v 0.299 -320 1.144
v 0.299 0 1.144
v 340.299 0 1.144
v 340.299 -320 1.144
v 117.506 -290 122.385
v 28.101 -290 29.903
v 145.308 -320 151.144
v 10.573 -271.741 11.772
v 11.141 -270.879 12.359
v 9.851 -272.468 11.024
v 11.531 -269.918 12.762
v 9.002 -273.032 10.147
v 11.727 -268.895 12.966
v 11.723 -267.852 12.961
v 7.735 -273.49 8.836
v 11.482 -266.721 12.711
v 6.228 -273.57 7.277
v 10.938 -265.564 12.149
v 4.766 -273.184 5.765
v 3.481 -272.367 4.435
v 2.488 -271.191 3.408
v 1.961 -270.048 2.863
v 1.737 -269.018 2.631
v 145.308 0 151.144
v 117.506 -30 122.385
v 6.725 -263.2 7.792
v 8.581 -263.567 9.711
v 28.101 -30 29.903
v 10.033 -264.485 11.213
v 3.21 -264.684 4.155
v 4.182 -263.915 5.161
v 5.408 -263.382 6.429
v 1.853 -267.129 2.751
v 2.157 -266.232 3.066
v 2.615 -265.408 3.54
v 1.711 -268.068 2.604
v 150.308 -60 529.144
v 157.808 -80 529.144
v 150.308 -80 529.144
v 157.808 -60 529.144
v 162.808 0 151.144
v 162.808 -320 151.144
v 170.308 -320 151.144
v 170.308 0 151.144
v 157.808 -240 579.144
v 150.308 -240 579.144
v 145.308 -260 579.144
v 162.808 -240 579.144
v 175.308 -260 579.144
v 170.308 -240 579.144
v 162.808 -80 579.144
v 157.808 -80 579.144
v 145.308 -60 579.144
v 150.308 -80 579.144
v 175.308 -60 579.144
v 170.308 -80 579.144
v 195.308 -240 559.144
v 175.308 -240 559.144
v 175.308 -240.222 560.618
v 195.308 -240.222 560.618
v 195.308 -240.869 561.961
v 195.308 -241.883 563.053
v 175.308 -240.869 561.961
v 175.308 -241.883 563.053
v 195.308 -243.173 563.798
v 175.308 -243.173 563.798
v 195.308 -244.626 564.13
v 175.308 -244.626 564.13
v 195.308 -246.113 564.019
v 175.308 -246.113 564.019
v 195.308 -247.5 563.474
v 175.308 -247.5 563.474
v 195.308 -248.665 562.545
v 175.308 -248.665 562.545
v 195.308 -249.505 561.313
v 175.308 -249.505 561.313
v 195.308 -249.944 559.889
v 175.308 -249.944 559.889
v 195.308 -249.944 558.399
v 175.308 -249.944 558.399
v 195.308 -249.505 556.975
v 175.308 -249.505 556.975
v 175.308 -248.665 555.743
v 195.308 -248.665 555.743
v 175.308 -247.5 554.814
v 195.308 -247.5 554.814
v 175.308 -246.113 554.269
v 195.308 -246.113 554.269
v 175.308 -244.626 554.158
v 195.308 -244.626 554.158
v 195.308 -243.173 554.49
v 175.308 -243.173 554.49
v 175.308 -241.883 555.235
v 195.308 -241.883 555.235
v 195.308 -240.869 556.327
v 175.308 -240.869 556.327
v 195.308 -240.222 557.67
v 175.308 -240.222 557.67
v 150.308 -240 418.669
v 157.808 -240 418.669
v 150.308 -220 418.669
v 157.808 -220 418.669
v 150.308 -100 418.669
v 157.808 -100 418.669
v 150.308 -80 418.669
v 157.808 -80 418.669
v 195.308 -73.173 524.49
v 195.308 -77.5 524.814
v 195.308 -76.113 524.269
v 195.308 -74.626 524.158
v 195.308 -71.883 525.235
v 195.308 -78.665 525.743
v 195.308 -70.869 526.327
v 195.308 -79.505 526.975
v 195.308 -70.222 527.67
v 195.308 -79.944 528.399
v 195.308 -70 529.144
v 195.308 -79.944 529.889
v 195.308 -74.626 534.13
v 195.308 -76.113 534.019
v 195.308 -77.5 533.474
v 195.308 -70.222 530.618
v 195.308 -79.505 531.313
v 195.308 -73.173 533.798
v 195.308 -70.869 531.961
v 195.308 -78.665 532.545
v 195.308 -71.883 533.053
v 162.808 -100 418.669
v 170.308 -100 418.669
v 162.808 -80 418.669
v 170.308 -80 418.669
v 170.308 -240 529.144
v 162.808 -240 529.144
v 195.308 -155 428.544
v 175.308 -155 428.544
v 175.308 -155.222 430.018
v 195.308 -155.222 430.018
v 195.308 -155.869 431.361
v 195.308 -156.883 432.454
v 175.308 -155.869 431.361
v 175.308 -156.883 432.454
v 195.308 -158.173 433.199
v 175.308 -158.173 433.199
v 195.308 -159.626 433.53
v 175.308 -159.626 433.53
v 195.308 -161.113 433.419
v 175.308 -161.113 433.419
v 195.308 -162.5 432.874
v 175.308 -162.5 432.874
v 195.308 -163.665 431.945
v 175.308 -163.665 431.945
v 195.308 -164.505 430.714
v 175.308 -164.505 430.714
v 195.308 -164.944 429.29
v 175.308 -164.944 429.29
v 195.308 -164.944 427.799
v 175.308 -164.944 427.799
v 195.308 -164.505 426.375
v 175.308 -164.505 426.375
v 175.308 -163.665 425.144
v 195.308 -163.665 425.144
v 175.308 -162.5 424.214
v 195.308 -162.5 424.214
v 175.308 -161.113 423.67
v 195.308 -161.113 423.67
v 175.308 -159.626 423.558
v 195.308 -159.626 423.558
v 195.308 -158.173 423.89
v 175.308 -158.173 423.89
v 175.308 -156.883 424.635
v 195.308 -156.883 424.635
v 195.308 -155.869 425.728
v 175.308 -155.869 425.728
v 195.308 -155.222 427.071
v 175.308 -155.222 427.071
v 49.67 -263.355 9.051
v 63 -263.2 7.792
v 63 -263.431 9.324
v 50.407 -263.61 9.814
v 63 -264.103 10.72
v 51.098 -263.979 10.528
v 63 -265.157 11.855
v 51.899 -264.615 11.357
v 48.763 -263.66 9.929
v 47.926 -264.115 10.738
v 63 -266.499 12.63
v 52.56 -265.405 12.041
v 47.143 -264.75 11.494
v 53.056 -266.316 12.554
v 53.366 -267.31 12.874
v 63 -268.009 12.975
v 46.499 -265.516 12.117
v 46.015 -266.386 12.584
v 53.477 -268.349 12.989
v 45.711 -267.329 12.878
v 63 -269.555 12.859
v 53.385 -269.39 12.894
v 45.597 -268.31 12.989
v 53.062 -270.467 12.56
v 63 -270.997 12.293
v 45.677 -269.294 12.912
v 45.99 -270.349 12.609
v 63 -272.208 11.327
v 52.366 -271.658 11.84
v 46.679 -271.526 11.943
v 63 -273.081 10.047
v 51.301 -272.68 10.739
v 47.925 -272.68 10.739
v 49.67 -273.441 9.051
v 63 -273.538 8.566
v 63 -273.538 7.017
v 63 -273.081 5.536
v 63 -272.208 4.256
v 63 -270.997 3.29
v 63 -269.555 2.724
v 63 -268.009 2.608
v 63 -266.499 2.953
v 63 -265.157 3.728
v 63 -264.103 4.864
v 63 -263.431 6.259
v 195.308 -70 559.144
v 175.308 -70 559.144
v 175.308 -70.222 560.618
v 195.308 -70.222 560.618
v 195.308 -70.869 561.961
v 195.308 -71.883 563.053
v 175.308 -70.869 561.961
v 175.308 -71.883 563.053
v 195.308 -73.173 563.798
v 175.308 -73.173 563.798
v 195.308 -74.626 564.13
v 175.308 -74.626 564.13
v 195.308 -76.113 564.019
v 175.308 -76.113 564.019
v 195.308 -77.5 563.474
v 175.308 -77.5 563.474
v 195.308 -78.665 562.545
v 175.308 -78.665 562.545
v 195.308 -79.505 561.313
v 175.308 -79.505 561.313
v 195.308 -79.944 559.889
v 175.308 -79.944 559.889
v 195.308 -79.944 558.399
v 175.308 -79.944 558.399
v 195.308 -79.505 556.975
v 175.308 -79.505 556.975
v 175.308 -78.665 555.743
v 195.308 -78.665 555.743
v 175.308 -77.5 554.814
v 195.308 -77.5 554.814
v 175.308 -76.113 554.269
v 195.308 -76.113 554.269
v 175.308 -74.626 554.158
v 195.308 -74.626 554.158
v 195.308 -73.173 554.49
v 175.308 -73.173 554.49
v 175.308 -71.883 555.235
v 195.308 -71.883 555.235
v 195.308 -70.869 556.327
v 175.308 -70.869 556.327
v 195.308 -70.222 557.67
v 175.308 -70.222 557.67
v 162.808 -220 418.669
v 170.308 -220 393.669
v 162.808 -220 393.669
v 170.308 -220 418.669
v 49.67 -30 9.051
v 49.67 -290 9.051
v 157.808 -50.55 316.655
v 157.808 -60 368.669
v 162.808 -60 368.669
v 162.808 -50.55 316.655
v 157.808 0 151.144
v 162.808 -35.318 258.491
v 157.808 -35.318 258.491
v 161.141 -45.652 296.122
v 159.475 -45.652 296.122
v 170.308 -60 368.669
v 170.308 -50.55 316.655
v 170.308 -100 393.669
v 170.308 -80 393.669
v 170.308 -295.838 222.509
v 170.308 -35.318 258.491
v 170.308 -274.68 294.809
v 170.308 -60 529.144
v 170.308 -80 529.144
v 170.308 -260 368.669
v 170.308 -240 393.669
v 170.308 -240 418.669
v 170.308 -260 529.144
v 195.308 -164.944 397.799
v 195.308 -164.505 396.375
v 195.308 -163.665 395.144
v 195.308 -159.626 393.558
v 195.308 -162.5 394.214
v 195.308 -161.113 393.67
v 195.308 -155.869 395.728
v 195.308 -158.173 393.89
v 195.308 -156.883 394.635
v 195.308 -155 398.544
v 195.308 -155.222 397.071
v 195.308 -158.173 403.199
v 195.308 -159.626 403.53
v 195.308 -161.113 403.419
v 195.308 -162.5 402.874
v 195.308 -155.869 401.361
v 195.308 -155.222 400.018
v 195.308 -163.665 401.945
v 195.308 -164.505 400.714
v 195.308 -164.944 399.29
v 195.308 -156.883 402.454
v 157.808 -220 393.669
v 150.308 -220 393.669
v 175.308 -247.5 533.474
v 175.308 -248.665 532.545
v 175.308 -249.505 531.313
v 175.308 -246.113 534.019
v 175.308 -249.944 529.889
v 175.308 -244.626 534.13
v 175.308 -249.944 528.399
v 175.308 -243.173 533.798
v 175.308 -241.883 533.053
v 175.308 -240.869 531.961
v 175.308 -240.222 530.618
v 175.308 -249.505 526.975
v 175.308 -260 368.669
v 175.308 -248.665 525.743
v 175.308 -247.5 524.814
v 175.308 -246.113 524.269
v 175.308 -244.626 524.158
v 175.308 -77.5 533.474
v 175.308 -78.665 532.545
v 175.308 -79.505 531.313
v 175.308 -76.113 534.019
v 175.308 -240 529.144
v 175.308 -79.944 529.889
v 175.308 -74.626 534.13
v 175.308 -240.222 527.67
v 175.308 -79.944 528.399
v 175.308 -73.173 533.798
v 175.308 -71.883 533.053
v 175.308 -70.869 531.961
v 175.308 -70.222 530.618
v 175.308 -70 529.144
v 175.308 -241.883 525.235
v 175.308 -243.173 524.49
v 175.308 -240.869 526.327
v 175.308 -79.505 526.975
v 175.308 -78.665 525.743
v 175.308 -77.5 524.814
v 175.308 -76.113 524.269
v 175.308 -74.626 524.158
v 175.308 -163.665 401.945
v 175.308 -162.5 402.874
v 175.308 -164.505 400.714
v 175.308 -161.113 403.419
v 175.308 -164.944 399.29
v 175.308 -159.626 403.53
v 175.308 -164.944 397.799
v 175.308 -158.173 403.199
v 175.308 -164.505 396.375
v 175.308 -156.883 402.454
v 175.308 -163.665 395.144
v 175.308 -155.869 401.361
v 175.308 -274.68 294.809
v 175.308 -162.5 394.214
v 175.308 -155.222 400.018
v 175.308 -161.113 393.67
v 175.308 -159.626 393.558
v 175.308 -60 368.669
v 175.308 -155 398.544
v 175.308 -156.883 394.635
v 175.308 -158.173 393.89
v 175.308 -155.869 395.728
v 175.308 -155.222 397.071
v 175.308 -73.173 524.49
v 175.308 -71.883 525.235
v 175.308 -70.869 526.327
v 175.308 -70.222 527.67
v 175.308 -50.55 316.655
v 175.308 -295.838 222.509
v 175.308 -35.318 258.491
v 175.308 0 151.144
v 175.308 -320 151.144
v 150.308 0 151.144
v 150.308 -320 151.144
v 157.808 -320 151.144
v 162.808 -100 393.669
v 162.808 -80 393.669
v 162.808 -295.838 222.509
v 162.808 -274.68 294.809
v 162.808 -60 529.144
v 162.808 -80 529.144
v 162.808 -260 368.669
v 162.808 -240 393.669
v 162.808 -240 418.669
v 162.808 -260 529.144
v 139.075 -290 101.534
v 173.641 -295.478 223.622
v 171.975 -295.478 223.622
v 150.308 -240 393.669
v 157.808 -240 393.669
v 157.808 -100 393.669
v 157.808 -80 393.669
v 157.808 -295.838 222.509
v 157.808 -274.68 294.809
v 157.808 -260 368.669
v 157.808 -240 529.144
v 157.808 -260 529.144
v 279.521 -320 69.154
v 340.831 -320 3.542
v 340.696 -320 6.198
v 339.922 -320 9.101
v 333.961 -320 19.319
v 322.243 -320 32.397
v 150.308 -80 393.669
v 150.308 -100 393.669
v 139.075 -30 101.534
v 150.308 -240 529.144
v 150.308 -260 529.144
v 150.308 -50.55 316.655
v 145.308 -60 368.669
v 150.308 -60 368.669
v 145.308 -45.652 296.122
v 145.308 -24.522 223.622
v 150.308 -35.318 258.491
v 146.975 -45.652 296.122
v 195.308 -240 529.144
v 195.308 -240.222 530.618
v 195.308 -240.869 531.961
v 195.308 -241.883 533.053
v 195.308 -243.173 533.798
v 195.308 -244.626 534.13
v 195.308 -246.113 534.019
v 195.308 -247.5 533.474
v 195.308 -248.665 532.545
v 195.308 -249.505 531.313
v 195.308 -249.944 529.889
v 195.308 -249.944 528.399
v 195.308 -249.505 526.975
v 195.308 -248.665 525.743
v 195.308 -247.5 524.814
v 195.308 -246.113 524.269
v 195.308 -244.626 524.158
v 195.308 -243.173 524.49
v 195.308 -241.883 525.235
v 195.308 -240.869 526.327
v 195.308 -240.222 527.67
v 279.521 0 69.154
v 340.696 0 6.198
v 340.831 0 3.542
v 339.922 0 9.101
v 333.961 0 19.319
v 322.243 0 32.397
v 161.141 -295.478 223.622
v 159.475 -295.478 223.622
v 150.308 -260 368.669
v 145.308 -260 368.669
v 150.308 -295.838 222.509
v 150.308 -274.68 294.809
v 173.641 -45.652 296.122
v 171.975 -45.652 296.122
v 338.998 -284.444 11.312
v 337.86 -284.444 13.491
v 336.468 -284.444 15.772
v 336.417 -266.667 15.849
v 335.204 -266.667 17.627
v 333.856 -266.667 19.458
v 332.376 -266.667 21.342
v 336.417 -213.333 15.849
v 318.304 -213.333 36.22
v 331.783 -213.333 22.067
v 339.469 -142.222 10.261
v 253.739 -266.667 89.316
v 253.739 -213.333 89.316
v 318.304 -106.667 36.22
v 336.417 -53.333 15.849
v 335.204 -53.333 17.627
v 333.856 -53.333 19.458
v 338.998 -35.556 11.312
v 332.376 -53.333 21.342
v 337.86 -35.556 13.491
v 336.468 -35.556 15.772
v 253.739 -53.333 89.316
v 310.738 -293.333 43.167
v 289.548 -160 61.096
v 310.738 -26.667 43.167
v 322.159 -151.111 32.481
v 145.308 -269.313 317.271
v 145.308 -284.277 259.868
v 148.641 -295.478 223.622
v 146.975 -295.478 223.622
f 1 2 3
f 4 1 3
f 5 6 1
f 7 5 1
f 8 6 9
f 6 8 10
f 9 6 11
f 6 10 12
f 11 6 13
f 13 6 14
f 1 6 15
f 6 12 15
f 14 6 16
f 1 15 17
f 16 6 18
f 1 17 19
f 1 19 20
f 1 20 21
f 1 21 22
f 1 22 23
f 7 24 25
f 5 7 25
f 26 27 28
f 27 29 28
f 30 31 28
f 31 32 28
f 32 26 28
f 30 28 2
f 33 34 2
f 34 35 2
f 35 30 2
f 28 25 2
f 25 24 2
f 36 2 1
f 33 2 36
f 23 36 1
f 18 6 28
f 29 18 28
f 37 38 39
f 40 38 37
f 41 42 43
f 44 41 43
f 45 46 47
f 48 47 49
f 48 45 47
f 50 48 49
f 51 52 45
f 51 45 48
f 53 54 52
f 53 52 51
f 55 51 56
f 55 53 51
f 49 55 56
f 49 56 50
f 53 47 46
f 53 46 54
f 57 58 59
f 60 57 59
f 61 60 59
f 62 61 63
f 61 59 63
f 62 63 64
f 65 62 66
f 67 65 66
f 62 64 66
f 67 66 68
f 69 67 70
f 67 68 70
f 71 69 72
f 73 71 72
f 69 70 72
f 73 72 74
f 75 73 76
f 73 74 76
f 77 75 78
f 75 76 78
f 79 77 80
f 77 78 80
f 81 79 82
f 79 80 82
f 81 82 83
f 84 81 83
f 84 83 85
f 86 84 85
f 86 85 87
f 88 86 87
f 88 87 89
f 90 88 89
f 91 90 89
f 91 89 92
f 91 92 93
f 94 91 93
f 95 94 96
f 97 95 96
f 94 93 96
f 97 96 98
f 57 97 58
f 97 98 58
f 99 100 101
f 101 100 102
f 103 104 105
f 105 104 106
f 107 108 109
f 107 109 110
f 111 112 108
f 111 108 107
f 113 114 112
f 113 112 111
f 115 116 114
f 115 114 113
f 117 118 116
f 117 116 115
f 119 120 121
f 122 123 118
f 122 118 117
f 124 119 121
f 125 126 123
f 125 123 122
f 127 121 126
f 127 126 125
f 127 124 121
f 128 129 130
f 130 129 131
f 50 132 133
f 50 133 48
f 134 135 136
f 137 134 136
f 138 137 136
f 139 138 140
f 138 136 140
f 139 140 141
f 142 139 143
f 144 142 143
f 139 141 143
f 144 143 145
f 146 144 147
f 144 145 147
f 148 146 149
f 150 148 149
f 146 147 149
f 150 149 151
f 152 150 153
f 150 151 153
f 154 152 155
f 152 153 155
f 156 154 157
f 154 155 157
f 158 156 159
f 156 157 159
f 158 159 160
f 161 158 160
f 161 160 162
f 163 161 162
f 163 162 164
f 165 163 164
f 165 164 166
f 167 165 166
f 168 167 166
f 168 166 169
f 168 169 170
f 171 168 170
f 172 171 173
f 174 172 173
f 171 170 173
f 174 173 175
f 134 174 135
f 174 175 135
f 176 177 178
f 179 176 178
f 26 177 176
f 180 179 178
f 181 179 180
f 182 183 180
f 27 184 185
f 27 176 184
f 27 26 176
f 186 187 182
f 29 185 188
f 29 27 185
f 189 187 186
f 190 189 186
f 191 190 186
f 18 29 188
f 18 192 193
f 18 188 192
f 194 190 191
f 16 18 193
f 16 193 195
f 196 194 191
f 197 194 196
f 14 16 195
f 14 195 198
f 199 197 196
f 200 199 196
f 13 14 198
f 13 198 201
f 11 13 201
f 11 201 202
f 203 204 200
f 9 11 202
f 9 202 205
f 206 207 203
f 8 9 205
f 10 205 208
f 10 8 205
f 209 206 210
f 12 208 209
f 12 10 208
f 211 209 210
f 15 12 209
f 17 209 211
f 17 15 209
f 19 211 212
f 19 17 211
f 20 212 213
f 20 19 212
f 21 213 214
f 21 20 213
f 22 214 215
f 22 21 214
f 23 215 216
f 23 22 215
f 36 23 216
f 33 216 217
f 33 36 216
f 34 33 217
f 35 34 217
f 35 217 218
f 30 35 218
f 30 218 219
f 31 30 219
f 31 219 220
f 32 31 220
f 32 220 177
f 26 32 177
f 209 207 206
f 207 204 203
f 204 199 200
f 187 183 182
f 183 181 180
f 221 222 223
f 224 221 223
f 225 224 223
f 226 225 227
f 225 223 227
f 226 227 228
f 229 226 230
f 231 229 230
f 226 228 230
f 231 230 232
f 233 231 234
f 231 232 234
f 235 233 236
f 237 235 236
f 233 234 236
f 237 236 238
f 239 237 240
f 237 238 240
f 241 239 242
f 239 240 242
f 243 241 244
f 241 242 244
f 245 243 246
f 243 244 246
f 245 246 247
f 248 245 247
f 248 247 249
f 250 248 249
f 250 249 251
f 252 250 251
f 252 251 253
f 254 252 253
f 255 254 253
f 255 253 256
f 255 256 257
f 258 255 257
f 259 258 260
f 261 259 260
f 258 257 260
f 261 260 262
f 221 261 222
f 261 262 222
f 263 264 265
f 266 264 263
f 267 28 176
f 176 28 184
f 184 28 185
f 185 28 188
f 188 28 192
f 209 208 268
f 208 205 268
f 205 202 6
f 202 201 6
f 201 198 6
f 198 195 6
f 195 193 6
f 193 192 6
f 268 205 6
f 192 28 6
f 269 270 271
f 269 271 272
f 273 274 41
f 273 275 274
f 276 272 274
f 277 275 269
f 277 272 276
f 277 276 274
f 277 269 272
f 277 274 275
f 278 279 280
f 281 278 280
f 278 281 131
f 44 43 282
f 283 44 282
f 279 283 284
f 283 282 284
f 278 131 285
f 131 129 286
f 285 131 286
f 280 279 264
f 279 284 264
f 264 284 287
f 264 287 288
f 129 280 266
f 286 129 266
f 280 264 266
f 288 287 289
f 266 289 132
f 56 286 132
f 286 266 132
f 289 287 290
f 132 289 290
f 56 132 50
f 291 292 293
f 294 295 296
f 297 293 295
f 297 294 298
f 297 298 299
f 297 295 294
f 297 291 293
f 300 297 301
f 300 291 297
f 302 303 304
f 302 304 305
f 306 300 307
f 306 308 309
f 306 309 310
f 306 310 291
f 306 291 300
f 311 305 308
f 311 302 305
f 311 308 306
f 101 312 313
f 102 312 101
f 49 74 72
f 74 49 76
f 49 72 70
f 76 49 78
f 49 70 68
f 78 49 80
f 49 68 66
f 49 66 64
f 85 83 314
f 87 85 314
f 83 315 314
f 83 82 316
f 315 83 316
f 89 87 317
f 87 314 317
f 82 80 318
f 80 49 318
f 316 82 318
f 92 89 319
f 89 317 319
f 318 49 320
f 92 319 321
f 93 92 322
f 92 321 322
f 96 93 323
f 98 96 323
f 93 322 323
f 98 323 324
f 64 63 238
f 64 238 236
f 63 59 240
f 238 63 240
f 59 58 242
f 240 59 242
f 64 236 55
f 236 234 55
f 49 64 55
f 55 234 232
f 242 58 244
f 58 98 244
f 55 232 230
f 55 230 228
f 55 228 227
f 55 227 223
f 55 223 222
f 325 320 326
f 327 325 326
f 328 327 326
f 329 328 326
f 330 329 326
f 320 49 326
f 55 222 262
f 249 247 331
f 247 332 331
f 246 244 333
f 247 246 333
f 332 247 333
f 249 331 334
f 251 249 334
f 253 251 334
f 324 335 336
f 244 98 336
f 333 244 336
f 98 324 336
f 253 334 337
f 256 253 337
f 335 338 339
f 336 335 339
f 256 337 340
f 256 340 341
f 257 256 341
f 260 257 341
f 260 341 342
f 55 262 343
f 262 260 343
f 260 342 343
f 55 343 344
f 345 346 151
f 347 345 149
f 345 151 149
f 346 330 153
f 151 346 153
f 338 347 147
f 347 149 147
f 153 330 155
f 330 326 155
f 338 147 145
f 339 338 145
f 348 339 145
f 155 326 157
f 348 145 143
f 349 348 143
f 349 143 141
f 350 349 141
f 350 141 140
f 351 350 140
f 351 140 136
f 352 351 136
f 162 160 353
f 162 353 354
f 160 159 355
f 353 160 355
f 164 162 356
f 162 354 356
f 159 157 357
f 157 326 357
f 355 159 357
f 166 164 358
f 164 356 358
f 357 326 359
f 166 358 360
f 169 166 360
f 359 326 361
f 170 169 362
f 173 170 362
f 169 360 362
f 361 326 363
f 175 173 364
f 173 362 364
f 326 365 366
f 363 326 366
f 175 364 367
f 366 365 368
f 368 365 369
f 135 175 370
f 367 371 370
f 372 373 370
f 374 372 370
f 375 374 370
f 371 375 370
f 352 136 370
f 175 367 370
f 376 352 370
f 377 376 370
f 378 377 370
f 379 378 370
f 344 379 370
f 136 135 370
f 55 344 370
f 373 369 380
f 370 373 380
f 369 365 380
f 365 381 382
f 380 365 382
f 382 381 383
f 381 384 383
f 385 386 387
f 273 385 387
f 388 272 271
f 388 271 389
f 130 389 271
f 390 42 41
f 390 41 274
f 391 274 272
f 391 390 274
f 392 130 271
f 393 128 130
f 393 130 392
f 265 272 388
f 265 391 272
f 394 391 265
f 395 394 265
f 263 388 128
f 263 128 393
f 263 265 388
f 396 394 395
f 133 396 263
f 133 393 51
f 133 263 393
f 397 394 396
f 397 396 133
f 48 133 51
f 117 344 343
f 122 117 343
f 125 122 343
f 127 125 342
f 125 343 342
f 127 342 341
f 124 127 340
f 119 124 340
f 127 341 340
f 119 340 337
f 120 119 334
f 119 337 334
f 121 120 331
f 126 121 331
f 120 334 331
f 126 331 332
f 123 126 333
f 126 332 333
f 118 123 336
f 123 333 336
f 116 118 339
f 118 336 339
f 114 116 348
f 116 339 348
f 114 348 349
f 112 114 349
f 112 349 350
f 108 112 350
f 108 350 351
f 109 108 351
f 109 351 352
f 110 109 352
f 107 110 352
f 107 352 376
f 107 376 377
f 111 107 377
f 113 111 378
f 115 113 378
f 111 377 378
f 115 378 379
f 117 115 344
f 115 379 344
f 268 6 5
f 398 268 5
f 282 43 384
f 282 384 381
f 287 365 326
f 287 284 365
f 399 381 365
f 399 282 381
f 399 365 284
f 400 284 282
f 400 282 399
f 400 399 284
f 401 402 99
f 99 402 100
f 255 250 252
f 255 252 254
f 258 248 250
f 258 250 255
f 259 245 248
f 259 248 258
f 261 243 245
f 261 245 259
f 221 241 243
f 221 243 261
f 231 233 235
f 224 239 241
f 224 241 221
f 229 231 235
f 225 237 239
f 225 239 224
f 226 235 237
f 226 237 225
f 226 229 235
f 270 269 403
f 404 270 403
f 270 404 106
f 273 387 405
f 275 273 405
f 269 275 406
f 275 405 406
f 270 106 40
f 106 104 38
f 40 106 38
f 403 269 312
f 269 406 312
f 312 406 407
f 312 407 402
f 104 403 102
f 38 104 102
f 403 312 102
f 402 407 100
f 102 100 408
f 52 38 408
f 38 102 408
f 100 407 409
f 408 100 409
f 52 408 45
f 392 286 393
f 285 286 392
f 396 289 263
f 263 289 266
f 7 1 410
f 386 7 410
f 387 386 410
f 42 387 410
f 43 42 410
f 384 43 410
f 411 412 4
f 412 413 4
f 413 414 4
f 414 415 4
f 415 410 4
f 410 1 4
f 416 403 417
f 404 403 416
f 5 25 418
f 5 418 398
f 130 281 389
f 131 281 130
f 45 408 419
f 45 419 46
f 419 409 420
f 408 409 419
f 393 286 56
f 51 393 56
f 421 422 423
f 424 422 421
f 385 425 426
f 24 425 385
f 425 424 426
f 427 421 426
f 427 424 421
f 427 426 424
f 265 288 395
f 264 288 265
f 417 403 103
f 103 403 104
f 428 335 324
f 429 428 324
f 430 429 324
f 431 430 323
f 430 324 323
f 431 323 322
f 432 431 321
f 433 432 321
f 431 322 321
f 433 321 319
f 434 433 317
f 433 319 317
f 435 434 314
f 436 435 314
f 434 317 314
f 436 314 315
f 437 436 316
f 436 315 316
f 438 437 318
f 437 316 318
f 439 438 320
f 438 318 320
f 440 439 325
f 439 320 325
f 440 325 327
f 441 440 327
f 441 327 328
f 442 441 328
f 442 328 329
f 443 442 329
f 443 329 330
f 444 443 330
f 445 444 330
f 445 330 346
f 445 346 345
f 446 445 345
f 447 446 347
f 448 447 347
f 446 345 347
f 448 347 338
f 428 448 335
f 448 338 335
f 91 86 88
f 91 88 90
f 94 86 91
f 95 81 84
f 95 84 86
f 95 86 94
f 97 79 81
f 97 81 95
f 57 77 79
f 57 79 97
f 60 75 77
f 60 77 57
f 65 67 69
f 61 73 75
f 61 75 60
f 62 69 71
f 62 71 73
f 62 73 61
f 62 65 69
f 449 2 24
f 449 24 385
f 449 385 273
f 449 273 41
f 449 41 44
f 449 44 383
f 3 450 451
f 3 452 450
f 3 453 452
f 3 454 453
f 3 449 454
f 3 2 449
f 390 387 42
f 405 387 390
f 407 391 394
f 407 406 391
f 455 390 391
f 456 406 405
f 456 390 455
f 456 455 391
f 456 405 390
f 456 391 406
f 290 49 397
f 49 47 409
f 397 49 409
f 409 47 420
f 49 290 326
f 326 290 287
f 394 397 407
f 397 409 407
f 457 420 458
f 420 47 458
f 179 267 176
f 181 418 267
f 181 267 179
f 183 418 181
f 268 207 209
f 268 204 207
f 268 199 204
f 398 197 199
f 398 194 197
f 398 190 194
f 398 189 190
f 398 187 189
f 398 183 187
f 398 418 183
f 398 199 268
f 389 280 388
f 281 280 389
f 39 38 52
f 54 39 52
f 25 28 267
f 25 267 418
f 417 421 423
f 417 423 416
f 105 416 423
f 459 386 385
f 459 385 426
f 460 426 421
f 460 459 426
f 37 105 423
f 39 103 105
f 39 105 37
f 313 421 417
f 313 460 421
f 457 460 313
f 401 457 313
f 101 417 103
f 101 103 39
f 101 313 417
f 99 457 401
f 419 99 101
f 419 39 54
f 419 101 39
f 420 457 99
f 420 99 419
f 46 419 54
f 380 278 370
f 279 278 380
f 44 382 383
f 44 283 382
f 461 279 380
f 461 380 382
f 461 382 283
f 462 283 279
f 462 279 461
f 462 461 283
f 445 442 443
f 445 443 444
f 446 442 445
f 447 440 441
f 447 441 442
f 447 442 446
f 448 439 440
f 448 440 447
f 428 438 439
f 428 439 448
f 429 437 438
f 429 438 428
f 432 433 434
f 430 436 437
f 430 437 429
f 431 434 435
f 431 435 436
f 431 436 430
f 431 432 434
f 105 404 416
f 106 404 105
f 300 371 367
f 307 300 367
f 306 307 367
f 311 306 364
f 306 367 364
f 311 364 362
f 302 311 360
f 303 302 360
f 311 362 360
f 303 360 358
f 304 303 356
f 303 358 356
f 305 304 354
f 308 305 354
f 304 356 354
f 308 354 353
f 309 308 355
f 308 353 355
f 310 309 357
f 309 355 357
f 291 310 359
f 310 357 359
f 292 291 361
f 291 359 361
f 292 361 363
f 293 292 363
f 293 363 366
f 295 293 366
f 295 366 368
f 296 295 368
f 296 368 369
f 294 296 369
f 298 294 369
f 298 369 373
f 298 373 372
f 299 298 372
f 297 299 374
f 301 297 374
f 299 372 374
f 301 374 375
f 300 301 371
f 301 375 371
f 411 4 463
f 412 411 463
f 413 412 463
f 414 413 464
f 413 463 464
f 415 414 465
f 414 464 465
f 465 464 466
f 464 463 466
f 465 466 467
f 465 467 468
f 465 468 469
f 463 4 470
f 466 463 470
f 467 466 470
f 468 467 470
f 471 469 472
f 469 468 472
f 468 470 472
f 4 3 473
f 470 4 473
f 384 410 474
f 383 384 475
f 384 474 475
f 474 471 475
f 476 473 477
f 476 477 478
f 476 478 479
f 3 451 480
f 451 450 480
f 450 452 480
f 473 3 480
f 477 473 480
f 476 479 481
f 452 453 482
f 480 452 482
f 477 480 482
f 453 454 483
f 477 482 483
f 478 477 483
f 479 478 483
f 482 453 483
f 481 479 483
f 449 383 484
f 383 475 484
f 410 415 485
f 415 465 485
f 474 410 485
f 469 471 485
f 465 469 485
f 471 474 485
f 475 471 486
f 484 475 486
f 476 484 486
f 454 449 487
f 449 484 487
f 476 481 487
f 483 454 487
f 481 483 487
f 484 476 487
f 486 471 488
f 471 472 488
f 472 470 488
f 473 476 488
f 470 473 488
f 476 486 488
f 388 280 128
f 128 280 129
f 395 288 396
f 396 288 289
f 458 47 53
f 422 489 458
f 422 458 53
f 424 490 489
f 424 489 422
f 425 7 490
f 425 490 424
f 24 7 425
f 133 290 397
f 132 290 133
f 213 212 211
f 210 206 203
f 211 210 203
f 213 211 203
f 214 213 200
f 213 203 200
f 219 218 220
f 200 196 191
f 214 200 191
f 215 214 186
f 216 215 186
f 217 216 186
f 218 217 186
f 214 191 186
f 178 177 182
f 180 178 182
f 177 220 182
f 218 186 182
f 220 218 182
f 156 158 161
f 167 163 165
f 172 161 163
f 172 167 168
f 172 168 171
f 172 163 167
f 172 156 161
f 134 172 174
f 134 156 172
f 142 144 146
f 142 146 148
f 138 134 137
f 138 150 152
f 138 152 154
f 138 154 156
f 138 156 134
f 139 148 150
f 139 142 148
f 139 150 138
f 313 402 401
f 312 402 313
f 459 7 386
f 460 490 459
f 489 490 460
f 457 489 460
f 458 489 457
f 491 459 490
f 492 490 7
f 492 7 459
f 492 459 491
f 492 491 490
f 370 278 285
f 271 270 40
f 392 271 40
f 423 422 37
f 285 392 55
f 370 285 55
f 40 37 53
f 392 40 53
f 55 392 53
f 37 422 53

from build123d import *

# Parameters (mm, degrees)
F1_DEPTH  = 320
F2_W      = 30
F2_H      = 320
F3_DEPTH  = 428
F5_DEPTH  = 205
F7_W      = 260
F7_H      = 128.6325914682
F8_DEPTH  = 30
F9_W      = 7.5
F9_H      = 457.219858036
F10_DEPTH = 977
F6_W      = 20
F6_H      = 50
F6_H_2    = 25
F11_DEPTH = 25
F12_R     = 5.1978686685
F13_DEPTH = 63
F14_R     = 5
F15_DEPTH = 20


with BuildPart() as f1:
    # F0 (on Front) → F1 (new body)
    with BuildSketch(Plane.XZ):
        with BuildLine():
            Line((150.299176857, 1.1440683747), (180.299176857, 1.1440683747))
            Line((180.299176857, 1.1440683747), (340.299176857, 1.1440683747))
            add(Edge.make_bspline(
                [(340.299176857, 1.1440683747), (349.1569172885, 24.1151609846), (251.1032390966, 88.0444564268), (175.3079980464, 151.1440683747)],
                knots=[0.4586039165, 0.4586039165, 0.4586039165, 0.4586039165, 1, 1, 1, 1], degree=3))
            Line((175.3079980464, 151.1440683747), (145.3079980464, 151.1440683747))
            Line((145.3079980464, 151.1440683747), (0.299176857, 1.1440683747))
            Line((0.299176857, 1.1440683747), (100.299176857, 1.1440683747))
            Line((100.299176857, 1.1440683747), (150.299176857, 1.1440683747))
        make_face()
    extrude(amount=F1_DEPTH)

    # F2 (on face) → F3 (join)
    with BuildSketch(Plane.XY.offset(151.1440683747)):
        with Locations((160.3079980464, -160)):
            Rectangle(F2_W, F2_H)
    extrude(amount=F3_DEPTH)

    # F4 (on face) → F5 (cut)
    with BuildSketch(Plane(origin=(145.3079980464, 0, 0), x_dir=(0, -1, 0), z_dir=(-1, 0, 0))):
        with BuildLine():
            Line((0, 579.1440683747), (0, 151.1440683747))
            add(Edge.make_bspline(
                [(60, 368.6685562134), (50.1739969339, 296.0916949665), (25.086998467, 223.6178816706), (0, 151.1440683747)],
                knots=[0.4913001533, 0.4913001533, 0.4913001533, 0.4913001533, 1, 1, 1, 1], degree=3))
            Line((60, 368.6685562134), (60, 579.1440683747))
            Line((60, 579.1440683747), (0, 579.1440683747))
        make_face()
        with BuildLine():
            add(Edge.make_bspline(
                [(320, 151.1440683747), (294.913001533, 223.6178816706), (269.8260030661, 296.0916949665), (260, 368.6685562134)],
                knots=[0, 0, 0, 0, 0.5086998467, 0.5086998467, 0.5086998467, 0.5086998467], degree=3))
            Line((320, 151.1440683747), (320, 579.1440683747))
            Line((320, 579.1440683747), (260, 579.1440683747))
            Line((260, 579.1440683747), (260, 368.6685562134))
        make_face()
    extrude(amount=-F5_DEPTH, mode=Mode.SUBTRACT)

    # F7 (on face) → F8 (cut)
    with BuildSketch(Plane(origin=(-0.4170581217, 0, 0.4031807106), x_dir=(0, -1, 0), z_dir=(-0.7189672474, 0, 0.6950439534))):
        with Locations((160, 105.3467844897)):
            Rectangle(F7_W, F7_H)
    extrude(amount=-F8_DEPTH, mode=Mode.SUBTRACT)

    # F9 (on face) → F10 (cut)
    with BuildSketch(Plane.XZ.offset(320)):
        with Locations((154.0579980464, 379.7539973927)):
            Rectangle(F9_W, F9_H)
        with Locations((166.5579980464, 379.7539973927)):
            Rectangle(F9_W, F9_H)
    extrude(amount=-F10_DEPTH, mode=Mode.SUBTRACT)

    # F6 (on face) → F11 (join)
    with BuildSketch(Plane.YZ.offset(175.3079980464)):
        with Locations((-250, 554.1440683747)):
            Rectangle(F6_W, F6_H)
        with Locations((-70, 554.1440683747)):
            Rectangle(F6_W, F6_H)
        with Locations((-230, 406.1685562134)):
            Rectangle(F6_W, F6_H_2)
        with Locations((-90, 406.1685562134)):
            Rectangle(F6_W, F6_H_2)
    extrude(amount=-F11_DEPTH)

    # F12 (on Right) → F13 (cut)
    with BuildSketch(Plane.YZ):
        with Locations((-268.3978974819, 7.7915792353)):
            Circle(F12_R)
    extrude(amount=F13_DEPTH, mode=Mode.SUBTRACT)

    # F14 (on face) → F15 (join)
    with BuildSketch(Plane.YZ.offset(175.3079980464)):
        with Locations((-245, 559.1440683747)):
            Circle(F14_R)
        with Locations((-245, 529.1440683747)):
            Circle(F14_R)
        with Locations((-75, 559.1440683747)):
            Circle(F14_R)
        with Locations((-75, 529.1440683747)):
            Circle(F14_R)
        with Locations((-160, 428.5443711281)):
            Circle(F14_R)
        with Locations((-160, 398.5443711281)):
            Circle(F14_R)
    extrude(amount=F15_DEPTH)


solid = f1.part
